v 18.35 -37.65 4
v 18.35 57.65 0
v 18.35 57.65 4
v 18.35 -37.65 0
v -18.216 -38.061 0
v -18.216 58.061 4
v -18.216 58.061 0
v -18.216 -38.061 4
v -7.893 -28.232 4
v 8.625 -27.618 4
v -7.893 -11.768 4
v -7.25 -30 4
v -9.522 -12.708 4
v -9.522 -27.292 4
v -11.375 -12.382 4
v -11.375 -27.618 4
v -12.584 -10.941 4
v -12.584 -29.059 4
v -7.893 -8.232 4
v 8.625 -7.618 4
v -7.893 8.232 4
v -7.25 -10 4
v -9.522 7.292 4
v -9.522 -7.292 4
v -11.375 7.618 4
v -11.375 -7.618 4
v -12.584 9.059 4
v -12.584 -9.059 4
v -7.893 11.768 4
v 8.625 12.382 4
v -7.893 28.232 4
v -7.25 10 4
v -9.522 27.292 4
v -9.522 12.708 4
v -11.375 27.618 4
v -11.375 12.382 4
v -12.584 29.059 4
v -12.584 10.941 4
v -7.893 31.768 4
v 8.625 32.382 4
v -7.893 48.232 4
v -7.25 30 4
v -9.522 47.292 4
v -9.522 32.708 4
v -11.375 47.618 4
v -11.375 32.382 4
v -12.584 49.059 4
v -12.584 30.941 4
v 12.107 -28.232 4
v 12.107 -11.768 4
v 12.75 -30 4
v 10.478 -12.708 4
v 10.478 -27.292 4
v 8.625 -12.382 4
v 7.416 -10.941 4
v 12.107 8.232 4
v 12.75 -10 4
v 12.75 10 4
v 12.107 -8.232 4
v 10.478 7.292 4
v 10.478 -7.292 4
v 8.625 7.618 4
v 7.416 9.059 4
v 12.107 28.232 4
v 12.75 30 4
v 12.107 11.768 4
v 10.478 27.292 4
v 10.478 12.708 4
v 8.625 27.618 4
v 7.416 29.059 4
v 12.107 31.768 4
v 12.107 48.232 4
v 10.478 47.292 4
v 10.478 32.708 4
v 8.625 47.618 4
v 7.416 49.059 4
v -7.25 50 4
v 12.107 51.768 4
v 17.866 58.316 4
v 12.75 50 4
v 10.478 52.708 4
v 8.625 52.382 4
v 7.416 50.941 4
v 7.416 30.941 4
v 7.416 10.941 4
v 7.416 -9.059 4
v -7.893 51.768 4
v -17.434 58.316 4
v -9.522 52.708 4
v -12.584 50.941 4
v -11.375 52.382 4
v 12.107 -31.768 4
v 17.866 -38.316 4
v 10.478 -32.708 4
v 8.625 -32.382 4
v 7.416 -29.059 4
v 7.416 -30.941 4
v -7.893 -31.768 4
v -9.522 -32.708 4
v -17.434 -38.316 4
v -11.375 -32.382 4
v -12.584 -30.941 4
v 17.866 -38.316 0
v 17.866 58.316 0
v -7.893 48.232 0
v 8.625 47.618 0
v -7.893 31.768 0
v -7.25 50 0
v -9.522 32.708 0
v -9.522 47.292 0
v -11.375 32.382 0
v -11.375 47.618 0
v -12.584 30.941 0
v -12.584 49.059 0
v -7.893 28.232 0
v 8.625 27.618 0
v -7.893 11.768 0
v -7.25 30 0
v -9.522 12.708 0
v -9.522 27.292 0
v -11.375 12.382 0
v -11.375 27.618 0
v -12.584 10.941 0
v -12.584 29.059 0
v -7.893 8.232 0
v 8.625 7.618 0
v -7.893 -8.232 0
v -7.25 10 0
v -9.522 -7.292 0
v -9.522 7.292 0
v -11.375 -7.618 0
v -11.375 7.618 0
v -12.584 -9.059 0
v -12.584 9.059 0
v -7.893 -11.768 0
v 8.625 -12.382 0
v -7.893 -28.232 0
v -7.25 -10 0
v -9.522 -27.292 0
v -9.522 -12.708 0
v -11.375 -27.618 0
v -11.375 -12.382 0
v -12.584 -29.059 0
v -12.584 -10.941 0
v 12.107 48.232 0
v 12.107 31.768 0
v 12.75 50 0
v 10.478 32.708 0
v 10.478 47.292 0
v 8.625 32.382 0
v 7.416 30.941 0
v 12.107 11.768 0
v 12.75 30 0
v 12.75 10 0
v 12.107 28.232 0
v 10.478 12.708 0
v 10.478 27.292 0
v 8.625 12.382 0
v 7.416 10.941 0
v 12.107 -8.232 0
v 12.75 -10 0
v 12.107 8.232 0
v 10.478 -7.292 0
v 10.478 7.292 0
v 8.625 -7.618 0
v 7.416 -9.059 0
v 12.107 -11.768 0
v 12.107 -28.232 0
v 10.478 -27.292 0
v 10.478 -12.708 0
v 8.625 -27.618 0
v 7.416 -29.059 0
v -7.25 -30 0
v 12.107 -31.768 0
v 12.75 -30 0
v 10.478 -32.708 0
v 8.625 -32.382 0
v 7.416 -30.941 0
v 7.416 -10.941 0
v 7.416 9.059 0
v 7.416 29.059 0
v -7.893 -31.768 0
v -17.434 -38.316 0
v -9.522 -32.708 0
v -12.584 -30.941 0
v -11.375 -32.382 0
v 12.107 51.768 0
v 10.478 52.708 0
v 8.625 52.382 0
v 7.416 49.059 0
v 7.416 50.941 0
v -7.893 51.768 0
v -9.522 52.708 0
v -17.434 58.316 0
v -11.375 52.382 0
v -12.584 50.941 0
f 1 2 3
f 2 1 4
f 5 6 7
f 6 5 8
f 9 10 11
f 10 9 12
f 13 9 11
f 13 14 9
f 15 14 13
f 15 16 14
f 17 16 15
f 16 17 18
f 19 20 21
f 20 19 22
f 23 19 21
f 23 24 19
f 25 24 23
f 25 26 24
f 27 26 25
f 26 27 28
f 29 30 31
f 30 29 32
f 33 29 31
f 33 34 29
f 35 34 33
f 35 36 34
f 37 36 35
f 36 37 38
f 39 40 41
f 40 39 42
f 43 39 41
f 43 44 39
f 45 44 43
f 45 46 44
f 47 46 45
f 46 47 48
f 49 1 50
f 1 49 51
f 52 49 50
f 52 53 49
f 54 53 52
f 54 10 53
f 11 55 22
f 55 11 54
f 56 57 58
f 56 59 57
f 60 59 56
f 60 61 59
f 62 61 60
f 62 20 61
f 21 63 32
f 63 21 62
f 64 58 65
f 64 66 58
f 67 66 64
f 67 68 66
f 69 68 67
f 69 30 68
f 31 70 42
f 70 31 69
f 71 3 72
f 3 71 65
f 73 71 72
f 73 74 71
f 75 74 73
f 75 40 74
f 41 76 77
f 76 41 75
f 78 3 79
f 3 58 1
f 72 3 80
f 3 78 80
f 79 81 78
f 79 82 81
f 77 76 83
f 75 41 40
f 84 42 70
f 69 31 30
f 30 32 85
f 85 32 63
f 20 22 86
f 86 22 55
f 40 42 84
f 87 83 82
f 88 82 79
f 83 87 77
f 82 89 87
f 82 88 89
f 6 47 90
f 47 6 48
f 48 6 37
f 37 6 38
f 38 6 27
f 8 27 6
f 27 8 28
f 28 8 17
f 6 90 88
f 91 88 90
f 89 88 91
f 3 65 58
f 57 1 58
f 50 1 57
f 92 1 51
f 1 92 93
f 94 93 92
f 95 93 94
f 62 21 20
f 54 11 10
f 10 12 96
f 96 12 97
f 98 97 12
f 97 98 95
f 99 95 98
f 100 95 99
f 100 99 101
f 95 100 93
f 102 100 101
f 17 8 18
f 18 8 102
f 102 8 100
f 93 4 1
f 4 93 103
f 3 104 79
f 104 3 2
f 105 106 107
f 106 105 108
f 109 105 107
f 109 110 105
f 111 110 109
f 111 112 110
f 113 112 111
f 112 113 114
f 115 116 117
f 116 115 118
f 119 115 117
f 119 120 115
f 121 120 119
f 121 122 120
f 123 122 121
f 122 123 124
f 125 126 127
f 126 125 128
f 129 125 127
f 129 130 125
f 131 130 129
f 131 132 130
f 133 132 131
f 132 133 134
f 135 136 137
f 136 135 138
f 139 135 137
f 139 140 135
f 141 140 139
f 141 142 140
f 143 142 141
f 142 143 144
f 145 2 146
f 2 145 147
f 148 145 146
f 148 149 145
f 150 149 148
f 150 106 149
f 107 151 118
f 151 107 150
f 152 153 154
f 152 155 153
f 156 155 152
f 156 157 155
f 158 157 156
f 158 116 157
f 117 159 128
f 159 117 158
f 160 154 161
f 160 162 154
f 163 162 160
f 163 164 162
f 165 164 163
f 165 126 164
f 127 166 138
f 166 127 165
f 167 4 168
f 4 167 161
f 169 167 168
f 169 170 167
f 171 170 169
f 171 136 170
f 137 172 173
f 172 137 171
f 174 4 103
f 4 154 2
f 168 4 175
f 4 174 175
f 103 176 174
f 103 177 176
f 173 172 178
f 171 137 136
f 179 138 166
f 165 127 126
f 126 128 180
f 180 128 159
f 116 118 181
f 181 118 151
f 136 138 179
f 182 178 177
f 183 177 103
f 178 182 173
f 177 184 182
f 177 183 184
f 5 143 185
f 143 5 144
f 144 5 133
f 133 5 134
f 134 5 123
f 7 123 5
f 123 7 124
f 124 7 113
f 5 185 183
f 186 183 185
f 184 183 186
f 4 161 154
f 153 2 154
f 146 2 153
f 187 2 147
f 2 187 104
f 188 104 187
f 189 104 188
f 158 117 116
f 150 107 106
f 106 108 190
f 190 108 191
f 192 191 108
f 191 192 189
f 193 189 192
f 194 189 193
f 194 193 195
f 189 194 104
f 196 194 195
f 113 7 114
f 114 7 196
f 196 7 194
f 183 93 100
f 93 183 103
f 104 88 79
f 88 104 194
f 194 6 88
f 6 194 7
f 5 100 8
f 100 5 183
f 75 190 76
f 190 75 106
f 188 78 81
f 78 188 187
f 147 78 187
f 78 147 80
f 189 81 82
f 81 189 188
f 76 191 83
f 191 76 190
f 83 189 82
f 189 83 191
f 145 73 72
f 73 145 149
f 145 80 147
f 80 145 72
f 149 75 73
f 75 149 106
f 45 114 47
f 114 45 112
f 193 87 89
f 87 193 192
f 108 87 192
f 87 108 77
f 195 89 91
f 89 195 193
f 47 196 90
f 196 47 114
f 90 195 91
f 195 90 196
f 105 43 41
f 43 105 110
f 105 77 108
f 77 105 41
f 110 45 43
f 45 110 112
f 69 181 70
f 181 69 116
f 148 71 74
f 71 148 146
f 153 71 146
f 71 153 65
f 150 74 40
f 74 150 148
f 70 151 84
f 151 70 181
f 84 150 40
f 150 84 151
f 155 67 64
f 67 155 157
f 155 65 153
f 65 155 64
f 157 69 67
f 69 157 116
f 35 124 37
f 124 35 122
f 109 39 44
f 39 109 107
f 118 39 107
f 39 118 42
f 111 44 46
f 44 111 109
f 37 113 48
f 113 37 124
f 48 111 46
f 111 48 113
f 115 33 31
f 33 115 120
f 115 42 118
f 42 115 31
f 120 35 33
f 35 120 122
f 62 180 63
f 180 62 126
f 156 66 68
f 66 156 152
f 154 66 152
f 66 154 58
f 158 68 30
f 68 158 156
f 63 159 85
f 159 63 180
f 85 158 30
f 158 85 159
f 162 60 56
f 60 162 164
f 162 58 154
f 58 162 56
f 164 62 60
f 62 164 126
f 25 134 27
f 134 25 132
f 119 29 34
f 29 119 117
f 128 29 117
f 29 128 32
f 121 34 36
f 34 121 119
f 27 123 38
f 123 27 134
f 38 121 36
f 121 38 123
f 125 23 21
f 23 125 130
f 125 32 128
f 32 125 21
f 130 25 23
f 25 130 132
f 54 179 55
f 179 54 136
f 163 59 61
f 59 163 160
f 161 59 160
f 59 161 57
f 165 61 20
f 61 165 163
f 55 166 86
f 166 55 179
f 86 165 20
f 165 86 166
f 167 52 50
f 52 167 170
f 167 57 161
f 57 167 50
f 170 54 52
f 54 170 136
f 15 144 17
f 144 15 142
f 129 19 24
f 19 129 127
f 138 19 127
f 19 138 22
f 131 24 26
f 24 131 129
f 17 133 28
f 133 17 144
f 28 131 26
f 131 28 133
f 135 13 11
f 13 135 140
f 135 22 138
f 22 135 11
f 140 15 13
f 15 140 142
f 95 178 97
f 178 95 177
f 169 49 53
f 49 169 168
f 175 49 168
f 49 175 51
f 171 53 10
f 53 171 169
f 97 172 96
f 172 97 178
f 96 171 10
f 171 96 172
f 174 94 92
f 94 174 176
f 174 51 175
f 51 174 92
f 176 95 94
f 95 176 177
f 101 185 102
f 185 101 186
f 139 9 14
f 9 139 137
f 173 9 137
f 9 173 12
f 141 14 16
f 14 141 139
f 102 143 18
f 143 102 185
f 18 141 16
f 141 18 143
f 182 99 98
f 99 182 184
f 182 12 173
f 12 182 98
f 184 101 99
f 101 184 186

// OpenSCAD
// rob@openpart.co.uk 20140130-23:55
// 10 hole joining plate for 40mm NOMINAL extrusion
// MakerSlide, V-Slot 4020 & others

module roundedRect(size, radius)
{
	x = size[0];
	y = size[1];
	z = size[2];
	linear_extrude(height=z)
	hull()
	{
		// place 4 circles in the corners, with the given radius
		translate([(-x/2)+(radius/2), (-y/2)+(radius/2), 0])
		circle(r=radius);
		translate([(x/2)-(radius/2), (-y/2)+(radius/2), 0])
		circle(r=radius);
		translate([(-x/2)+(radius/2), (y/2)-(radius/2), 0])
		circle(r=radius);
		translate([(x/2)-(radius/2), (y/2)-(radius/2), 0])
		circle(r=radius);
	}
}

hole = 5.5 / 2;
plate_width = 96;
plate_length = 36;
plate_thickness = 4;
extend_past_thickness = 2;
corner_radius = 0.7;

difference() {
	translate([0, 10, 0])
		roundedRect ([plate_length, plate_width, plate_thickness], corner_radius);
	
	// Holes
	translate([10,50,-1])
		cylinder(h = (extend_past_thickness+plate_thickness+2), r = hole);
	translate([-10,50,-1])
		cylinder(h = (extend_past_thickness+plate_thickness+2), r = hole);
	translate([10,30,-1])
		cylinder(h = (extend_past_thickness+plate_thickness+2), r = hole);
	translate([-10,30,-1])
		cylinder(h = (extend_past_thickness+plate_thickness+2), r = hole);
	translate([10,10,-1])
		cylinder(h = (extend_past_thickness+plate_thickness+2), r = hole);
	translate([-10,10,-1])
		cylinder(h = (extend_past_thickness+plate_thickness+2), r = hole);
	translate([10,-10,-1])
		cylinder(h = (extend_past_thickness+plate_thickness+2), r = hole);
	translate([-10,-10,-1])
		cylinder(h = (extend_past_thickness+plate_thickness+2), r = hole);
	translate([10,-30,-1])
		cylinder(h = (extend_past_thickness+plate_thickness+2), r = hole);
	translate([-10,-30,-1])
		cylinder(h = (extend_past_thickness+plate_thickness+2), r = hole);
}
